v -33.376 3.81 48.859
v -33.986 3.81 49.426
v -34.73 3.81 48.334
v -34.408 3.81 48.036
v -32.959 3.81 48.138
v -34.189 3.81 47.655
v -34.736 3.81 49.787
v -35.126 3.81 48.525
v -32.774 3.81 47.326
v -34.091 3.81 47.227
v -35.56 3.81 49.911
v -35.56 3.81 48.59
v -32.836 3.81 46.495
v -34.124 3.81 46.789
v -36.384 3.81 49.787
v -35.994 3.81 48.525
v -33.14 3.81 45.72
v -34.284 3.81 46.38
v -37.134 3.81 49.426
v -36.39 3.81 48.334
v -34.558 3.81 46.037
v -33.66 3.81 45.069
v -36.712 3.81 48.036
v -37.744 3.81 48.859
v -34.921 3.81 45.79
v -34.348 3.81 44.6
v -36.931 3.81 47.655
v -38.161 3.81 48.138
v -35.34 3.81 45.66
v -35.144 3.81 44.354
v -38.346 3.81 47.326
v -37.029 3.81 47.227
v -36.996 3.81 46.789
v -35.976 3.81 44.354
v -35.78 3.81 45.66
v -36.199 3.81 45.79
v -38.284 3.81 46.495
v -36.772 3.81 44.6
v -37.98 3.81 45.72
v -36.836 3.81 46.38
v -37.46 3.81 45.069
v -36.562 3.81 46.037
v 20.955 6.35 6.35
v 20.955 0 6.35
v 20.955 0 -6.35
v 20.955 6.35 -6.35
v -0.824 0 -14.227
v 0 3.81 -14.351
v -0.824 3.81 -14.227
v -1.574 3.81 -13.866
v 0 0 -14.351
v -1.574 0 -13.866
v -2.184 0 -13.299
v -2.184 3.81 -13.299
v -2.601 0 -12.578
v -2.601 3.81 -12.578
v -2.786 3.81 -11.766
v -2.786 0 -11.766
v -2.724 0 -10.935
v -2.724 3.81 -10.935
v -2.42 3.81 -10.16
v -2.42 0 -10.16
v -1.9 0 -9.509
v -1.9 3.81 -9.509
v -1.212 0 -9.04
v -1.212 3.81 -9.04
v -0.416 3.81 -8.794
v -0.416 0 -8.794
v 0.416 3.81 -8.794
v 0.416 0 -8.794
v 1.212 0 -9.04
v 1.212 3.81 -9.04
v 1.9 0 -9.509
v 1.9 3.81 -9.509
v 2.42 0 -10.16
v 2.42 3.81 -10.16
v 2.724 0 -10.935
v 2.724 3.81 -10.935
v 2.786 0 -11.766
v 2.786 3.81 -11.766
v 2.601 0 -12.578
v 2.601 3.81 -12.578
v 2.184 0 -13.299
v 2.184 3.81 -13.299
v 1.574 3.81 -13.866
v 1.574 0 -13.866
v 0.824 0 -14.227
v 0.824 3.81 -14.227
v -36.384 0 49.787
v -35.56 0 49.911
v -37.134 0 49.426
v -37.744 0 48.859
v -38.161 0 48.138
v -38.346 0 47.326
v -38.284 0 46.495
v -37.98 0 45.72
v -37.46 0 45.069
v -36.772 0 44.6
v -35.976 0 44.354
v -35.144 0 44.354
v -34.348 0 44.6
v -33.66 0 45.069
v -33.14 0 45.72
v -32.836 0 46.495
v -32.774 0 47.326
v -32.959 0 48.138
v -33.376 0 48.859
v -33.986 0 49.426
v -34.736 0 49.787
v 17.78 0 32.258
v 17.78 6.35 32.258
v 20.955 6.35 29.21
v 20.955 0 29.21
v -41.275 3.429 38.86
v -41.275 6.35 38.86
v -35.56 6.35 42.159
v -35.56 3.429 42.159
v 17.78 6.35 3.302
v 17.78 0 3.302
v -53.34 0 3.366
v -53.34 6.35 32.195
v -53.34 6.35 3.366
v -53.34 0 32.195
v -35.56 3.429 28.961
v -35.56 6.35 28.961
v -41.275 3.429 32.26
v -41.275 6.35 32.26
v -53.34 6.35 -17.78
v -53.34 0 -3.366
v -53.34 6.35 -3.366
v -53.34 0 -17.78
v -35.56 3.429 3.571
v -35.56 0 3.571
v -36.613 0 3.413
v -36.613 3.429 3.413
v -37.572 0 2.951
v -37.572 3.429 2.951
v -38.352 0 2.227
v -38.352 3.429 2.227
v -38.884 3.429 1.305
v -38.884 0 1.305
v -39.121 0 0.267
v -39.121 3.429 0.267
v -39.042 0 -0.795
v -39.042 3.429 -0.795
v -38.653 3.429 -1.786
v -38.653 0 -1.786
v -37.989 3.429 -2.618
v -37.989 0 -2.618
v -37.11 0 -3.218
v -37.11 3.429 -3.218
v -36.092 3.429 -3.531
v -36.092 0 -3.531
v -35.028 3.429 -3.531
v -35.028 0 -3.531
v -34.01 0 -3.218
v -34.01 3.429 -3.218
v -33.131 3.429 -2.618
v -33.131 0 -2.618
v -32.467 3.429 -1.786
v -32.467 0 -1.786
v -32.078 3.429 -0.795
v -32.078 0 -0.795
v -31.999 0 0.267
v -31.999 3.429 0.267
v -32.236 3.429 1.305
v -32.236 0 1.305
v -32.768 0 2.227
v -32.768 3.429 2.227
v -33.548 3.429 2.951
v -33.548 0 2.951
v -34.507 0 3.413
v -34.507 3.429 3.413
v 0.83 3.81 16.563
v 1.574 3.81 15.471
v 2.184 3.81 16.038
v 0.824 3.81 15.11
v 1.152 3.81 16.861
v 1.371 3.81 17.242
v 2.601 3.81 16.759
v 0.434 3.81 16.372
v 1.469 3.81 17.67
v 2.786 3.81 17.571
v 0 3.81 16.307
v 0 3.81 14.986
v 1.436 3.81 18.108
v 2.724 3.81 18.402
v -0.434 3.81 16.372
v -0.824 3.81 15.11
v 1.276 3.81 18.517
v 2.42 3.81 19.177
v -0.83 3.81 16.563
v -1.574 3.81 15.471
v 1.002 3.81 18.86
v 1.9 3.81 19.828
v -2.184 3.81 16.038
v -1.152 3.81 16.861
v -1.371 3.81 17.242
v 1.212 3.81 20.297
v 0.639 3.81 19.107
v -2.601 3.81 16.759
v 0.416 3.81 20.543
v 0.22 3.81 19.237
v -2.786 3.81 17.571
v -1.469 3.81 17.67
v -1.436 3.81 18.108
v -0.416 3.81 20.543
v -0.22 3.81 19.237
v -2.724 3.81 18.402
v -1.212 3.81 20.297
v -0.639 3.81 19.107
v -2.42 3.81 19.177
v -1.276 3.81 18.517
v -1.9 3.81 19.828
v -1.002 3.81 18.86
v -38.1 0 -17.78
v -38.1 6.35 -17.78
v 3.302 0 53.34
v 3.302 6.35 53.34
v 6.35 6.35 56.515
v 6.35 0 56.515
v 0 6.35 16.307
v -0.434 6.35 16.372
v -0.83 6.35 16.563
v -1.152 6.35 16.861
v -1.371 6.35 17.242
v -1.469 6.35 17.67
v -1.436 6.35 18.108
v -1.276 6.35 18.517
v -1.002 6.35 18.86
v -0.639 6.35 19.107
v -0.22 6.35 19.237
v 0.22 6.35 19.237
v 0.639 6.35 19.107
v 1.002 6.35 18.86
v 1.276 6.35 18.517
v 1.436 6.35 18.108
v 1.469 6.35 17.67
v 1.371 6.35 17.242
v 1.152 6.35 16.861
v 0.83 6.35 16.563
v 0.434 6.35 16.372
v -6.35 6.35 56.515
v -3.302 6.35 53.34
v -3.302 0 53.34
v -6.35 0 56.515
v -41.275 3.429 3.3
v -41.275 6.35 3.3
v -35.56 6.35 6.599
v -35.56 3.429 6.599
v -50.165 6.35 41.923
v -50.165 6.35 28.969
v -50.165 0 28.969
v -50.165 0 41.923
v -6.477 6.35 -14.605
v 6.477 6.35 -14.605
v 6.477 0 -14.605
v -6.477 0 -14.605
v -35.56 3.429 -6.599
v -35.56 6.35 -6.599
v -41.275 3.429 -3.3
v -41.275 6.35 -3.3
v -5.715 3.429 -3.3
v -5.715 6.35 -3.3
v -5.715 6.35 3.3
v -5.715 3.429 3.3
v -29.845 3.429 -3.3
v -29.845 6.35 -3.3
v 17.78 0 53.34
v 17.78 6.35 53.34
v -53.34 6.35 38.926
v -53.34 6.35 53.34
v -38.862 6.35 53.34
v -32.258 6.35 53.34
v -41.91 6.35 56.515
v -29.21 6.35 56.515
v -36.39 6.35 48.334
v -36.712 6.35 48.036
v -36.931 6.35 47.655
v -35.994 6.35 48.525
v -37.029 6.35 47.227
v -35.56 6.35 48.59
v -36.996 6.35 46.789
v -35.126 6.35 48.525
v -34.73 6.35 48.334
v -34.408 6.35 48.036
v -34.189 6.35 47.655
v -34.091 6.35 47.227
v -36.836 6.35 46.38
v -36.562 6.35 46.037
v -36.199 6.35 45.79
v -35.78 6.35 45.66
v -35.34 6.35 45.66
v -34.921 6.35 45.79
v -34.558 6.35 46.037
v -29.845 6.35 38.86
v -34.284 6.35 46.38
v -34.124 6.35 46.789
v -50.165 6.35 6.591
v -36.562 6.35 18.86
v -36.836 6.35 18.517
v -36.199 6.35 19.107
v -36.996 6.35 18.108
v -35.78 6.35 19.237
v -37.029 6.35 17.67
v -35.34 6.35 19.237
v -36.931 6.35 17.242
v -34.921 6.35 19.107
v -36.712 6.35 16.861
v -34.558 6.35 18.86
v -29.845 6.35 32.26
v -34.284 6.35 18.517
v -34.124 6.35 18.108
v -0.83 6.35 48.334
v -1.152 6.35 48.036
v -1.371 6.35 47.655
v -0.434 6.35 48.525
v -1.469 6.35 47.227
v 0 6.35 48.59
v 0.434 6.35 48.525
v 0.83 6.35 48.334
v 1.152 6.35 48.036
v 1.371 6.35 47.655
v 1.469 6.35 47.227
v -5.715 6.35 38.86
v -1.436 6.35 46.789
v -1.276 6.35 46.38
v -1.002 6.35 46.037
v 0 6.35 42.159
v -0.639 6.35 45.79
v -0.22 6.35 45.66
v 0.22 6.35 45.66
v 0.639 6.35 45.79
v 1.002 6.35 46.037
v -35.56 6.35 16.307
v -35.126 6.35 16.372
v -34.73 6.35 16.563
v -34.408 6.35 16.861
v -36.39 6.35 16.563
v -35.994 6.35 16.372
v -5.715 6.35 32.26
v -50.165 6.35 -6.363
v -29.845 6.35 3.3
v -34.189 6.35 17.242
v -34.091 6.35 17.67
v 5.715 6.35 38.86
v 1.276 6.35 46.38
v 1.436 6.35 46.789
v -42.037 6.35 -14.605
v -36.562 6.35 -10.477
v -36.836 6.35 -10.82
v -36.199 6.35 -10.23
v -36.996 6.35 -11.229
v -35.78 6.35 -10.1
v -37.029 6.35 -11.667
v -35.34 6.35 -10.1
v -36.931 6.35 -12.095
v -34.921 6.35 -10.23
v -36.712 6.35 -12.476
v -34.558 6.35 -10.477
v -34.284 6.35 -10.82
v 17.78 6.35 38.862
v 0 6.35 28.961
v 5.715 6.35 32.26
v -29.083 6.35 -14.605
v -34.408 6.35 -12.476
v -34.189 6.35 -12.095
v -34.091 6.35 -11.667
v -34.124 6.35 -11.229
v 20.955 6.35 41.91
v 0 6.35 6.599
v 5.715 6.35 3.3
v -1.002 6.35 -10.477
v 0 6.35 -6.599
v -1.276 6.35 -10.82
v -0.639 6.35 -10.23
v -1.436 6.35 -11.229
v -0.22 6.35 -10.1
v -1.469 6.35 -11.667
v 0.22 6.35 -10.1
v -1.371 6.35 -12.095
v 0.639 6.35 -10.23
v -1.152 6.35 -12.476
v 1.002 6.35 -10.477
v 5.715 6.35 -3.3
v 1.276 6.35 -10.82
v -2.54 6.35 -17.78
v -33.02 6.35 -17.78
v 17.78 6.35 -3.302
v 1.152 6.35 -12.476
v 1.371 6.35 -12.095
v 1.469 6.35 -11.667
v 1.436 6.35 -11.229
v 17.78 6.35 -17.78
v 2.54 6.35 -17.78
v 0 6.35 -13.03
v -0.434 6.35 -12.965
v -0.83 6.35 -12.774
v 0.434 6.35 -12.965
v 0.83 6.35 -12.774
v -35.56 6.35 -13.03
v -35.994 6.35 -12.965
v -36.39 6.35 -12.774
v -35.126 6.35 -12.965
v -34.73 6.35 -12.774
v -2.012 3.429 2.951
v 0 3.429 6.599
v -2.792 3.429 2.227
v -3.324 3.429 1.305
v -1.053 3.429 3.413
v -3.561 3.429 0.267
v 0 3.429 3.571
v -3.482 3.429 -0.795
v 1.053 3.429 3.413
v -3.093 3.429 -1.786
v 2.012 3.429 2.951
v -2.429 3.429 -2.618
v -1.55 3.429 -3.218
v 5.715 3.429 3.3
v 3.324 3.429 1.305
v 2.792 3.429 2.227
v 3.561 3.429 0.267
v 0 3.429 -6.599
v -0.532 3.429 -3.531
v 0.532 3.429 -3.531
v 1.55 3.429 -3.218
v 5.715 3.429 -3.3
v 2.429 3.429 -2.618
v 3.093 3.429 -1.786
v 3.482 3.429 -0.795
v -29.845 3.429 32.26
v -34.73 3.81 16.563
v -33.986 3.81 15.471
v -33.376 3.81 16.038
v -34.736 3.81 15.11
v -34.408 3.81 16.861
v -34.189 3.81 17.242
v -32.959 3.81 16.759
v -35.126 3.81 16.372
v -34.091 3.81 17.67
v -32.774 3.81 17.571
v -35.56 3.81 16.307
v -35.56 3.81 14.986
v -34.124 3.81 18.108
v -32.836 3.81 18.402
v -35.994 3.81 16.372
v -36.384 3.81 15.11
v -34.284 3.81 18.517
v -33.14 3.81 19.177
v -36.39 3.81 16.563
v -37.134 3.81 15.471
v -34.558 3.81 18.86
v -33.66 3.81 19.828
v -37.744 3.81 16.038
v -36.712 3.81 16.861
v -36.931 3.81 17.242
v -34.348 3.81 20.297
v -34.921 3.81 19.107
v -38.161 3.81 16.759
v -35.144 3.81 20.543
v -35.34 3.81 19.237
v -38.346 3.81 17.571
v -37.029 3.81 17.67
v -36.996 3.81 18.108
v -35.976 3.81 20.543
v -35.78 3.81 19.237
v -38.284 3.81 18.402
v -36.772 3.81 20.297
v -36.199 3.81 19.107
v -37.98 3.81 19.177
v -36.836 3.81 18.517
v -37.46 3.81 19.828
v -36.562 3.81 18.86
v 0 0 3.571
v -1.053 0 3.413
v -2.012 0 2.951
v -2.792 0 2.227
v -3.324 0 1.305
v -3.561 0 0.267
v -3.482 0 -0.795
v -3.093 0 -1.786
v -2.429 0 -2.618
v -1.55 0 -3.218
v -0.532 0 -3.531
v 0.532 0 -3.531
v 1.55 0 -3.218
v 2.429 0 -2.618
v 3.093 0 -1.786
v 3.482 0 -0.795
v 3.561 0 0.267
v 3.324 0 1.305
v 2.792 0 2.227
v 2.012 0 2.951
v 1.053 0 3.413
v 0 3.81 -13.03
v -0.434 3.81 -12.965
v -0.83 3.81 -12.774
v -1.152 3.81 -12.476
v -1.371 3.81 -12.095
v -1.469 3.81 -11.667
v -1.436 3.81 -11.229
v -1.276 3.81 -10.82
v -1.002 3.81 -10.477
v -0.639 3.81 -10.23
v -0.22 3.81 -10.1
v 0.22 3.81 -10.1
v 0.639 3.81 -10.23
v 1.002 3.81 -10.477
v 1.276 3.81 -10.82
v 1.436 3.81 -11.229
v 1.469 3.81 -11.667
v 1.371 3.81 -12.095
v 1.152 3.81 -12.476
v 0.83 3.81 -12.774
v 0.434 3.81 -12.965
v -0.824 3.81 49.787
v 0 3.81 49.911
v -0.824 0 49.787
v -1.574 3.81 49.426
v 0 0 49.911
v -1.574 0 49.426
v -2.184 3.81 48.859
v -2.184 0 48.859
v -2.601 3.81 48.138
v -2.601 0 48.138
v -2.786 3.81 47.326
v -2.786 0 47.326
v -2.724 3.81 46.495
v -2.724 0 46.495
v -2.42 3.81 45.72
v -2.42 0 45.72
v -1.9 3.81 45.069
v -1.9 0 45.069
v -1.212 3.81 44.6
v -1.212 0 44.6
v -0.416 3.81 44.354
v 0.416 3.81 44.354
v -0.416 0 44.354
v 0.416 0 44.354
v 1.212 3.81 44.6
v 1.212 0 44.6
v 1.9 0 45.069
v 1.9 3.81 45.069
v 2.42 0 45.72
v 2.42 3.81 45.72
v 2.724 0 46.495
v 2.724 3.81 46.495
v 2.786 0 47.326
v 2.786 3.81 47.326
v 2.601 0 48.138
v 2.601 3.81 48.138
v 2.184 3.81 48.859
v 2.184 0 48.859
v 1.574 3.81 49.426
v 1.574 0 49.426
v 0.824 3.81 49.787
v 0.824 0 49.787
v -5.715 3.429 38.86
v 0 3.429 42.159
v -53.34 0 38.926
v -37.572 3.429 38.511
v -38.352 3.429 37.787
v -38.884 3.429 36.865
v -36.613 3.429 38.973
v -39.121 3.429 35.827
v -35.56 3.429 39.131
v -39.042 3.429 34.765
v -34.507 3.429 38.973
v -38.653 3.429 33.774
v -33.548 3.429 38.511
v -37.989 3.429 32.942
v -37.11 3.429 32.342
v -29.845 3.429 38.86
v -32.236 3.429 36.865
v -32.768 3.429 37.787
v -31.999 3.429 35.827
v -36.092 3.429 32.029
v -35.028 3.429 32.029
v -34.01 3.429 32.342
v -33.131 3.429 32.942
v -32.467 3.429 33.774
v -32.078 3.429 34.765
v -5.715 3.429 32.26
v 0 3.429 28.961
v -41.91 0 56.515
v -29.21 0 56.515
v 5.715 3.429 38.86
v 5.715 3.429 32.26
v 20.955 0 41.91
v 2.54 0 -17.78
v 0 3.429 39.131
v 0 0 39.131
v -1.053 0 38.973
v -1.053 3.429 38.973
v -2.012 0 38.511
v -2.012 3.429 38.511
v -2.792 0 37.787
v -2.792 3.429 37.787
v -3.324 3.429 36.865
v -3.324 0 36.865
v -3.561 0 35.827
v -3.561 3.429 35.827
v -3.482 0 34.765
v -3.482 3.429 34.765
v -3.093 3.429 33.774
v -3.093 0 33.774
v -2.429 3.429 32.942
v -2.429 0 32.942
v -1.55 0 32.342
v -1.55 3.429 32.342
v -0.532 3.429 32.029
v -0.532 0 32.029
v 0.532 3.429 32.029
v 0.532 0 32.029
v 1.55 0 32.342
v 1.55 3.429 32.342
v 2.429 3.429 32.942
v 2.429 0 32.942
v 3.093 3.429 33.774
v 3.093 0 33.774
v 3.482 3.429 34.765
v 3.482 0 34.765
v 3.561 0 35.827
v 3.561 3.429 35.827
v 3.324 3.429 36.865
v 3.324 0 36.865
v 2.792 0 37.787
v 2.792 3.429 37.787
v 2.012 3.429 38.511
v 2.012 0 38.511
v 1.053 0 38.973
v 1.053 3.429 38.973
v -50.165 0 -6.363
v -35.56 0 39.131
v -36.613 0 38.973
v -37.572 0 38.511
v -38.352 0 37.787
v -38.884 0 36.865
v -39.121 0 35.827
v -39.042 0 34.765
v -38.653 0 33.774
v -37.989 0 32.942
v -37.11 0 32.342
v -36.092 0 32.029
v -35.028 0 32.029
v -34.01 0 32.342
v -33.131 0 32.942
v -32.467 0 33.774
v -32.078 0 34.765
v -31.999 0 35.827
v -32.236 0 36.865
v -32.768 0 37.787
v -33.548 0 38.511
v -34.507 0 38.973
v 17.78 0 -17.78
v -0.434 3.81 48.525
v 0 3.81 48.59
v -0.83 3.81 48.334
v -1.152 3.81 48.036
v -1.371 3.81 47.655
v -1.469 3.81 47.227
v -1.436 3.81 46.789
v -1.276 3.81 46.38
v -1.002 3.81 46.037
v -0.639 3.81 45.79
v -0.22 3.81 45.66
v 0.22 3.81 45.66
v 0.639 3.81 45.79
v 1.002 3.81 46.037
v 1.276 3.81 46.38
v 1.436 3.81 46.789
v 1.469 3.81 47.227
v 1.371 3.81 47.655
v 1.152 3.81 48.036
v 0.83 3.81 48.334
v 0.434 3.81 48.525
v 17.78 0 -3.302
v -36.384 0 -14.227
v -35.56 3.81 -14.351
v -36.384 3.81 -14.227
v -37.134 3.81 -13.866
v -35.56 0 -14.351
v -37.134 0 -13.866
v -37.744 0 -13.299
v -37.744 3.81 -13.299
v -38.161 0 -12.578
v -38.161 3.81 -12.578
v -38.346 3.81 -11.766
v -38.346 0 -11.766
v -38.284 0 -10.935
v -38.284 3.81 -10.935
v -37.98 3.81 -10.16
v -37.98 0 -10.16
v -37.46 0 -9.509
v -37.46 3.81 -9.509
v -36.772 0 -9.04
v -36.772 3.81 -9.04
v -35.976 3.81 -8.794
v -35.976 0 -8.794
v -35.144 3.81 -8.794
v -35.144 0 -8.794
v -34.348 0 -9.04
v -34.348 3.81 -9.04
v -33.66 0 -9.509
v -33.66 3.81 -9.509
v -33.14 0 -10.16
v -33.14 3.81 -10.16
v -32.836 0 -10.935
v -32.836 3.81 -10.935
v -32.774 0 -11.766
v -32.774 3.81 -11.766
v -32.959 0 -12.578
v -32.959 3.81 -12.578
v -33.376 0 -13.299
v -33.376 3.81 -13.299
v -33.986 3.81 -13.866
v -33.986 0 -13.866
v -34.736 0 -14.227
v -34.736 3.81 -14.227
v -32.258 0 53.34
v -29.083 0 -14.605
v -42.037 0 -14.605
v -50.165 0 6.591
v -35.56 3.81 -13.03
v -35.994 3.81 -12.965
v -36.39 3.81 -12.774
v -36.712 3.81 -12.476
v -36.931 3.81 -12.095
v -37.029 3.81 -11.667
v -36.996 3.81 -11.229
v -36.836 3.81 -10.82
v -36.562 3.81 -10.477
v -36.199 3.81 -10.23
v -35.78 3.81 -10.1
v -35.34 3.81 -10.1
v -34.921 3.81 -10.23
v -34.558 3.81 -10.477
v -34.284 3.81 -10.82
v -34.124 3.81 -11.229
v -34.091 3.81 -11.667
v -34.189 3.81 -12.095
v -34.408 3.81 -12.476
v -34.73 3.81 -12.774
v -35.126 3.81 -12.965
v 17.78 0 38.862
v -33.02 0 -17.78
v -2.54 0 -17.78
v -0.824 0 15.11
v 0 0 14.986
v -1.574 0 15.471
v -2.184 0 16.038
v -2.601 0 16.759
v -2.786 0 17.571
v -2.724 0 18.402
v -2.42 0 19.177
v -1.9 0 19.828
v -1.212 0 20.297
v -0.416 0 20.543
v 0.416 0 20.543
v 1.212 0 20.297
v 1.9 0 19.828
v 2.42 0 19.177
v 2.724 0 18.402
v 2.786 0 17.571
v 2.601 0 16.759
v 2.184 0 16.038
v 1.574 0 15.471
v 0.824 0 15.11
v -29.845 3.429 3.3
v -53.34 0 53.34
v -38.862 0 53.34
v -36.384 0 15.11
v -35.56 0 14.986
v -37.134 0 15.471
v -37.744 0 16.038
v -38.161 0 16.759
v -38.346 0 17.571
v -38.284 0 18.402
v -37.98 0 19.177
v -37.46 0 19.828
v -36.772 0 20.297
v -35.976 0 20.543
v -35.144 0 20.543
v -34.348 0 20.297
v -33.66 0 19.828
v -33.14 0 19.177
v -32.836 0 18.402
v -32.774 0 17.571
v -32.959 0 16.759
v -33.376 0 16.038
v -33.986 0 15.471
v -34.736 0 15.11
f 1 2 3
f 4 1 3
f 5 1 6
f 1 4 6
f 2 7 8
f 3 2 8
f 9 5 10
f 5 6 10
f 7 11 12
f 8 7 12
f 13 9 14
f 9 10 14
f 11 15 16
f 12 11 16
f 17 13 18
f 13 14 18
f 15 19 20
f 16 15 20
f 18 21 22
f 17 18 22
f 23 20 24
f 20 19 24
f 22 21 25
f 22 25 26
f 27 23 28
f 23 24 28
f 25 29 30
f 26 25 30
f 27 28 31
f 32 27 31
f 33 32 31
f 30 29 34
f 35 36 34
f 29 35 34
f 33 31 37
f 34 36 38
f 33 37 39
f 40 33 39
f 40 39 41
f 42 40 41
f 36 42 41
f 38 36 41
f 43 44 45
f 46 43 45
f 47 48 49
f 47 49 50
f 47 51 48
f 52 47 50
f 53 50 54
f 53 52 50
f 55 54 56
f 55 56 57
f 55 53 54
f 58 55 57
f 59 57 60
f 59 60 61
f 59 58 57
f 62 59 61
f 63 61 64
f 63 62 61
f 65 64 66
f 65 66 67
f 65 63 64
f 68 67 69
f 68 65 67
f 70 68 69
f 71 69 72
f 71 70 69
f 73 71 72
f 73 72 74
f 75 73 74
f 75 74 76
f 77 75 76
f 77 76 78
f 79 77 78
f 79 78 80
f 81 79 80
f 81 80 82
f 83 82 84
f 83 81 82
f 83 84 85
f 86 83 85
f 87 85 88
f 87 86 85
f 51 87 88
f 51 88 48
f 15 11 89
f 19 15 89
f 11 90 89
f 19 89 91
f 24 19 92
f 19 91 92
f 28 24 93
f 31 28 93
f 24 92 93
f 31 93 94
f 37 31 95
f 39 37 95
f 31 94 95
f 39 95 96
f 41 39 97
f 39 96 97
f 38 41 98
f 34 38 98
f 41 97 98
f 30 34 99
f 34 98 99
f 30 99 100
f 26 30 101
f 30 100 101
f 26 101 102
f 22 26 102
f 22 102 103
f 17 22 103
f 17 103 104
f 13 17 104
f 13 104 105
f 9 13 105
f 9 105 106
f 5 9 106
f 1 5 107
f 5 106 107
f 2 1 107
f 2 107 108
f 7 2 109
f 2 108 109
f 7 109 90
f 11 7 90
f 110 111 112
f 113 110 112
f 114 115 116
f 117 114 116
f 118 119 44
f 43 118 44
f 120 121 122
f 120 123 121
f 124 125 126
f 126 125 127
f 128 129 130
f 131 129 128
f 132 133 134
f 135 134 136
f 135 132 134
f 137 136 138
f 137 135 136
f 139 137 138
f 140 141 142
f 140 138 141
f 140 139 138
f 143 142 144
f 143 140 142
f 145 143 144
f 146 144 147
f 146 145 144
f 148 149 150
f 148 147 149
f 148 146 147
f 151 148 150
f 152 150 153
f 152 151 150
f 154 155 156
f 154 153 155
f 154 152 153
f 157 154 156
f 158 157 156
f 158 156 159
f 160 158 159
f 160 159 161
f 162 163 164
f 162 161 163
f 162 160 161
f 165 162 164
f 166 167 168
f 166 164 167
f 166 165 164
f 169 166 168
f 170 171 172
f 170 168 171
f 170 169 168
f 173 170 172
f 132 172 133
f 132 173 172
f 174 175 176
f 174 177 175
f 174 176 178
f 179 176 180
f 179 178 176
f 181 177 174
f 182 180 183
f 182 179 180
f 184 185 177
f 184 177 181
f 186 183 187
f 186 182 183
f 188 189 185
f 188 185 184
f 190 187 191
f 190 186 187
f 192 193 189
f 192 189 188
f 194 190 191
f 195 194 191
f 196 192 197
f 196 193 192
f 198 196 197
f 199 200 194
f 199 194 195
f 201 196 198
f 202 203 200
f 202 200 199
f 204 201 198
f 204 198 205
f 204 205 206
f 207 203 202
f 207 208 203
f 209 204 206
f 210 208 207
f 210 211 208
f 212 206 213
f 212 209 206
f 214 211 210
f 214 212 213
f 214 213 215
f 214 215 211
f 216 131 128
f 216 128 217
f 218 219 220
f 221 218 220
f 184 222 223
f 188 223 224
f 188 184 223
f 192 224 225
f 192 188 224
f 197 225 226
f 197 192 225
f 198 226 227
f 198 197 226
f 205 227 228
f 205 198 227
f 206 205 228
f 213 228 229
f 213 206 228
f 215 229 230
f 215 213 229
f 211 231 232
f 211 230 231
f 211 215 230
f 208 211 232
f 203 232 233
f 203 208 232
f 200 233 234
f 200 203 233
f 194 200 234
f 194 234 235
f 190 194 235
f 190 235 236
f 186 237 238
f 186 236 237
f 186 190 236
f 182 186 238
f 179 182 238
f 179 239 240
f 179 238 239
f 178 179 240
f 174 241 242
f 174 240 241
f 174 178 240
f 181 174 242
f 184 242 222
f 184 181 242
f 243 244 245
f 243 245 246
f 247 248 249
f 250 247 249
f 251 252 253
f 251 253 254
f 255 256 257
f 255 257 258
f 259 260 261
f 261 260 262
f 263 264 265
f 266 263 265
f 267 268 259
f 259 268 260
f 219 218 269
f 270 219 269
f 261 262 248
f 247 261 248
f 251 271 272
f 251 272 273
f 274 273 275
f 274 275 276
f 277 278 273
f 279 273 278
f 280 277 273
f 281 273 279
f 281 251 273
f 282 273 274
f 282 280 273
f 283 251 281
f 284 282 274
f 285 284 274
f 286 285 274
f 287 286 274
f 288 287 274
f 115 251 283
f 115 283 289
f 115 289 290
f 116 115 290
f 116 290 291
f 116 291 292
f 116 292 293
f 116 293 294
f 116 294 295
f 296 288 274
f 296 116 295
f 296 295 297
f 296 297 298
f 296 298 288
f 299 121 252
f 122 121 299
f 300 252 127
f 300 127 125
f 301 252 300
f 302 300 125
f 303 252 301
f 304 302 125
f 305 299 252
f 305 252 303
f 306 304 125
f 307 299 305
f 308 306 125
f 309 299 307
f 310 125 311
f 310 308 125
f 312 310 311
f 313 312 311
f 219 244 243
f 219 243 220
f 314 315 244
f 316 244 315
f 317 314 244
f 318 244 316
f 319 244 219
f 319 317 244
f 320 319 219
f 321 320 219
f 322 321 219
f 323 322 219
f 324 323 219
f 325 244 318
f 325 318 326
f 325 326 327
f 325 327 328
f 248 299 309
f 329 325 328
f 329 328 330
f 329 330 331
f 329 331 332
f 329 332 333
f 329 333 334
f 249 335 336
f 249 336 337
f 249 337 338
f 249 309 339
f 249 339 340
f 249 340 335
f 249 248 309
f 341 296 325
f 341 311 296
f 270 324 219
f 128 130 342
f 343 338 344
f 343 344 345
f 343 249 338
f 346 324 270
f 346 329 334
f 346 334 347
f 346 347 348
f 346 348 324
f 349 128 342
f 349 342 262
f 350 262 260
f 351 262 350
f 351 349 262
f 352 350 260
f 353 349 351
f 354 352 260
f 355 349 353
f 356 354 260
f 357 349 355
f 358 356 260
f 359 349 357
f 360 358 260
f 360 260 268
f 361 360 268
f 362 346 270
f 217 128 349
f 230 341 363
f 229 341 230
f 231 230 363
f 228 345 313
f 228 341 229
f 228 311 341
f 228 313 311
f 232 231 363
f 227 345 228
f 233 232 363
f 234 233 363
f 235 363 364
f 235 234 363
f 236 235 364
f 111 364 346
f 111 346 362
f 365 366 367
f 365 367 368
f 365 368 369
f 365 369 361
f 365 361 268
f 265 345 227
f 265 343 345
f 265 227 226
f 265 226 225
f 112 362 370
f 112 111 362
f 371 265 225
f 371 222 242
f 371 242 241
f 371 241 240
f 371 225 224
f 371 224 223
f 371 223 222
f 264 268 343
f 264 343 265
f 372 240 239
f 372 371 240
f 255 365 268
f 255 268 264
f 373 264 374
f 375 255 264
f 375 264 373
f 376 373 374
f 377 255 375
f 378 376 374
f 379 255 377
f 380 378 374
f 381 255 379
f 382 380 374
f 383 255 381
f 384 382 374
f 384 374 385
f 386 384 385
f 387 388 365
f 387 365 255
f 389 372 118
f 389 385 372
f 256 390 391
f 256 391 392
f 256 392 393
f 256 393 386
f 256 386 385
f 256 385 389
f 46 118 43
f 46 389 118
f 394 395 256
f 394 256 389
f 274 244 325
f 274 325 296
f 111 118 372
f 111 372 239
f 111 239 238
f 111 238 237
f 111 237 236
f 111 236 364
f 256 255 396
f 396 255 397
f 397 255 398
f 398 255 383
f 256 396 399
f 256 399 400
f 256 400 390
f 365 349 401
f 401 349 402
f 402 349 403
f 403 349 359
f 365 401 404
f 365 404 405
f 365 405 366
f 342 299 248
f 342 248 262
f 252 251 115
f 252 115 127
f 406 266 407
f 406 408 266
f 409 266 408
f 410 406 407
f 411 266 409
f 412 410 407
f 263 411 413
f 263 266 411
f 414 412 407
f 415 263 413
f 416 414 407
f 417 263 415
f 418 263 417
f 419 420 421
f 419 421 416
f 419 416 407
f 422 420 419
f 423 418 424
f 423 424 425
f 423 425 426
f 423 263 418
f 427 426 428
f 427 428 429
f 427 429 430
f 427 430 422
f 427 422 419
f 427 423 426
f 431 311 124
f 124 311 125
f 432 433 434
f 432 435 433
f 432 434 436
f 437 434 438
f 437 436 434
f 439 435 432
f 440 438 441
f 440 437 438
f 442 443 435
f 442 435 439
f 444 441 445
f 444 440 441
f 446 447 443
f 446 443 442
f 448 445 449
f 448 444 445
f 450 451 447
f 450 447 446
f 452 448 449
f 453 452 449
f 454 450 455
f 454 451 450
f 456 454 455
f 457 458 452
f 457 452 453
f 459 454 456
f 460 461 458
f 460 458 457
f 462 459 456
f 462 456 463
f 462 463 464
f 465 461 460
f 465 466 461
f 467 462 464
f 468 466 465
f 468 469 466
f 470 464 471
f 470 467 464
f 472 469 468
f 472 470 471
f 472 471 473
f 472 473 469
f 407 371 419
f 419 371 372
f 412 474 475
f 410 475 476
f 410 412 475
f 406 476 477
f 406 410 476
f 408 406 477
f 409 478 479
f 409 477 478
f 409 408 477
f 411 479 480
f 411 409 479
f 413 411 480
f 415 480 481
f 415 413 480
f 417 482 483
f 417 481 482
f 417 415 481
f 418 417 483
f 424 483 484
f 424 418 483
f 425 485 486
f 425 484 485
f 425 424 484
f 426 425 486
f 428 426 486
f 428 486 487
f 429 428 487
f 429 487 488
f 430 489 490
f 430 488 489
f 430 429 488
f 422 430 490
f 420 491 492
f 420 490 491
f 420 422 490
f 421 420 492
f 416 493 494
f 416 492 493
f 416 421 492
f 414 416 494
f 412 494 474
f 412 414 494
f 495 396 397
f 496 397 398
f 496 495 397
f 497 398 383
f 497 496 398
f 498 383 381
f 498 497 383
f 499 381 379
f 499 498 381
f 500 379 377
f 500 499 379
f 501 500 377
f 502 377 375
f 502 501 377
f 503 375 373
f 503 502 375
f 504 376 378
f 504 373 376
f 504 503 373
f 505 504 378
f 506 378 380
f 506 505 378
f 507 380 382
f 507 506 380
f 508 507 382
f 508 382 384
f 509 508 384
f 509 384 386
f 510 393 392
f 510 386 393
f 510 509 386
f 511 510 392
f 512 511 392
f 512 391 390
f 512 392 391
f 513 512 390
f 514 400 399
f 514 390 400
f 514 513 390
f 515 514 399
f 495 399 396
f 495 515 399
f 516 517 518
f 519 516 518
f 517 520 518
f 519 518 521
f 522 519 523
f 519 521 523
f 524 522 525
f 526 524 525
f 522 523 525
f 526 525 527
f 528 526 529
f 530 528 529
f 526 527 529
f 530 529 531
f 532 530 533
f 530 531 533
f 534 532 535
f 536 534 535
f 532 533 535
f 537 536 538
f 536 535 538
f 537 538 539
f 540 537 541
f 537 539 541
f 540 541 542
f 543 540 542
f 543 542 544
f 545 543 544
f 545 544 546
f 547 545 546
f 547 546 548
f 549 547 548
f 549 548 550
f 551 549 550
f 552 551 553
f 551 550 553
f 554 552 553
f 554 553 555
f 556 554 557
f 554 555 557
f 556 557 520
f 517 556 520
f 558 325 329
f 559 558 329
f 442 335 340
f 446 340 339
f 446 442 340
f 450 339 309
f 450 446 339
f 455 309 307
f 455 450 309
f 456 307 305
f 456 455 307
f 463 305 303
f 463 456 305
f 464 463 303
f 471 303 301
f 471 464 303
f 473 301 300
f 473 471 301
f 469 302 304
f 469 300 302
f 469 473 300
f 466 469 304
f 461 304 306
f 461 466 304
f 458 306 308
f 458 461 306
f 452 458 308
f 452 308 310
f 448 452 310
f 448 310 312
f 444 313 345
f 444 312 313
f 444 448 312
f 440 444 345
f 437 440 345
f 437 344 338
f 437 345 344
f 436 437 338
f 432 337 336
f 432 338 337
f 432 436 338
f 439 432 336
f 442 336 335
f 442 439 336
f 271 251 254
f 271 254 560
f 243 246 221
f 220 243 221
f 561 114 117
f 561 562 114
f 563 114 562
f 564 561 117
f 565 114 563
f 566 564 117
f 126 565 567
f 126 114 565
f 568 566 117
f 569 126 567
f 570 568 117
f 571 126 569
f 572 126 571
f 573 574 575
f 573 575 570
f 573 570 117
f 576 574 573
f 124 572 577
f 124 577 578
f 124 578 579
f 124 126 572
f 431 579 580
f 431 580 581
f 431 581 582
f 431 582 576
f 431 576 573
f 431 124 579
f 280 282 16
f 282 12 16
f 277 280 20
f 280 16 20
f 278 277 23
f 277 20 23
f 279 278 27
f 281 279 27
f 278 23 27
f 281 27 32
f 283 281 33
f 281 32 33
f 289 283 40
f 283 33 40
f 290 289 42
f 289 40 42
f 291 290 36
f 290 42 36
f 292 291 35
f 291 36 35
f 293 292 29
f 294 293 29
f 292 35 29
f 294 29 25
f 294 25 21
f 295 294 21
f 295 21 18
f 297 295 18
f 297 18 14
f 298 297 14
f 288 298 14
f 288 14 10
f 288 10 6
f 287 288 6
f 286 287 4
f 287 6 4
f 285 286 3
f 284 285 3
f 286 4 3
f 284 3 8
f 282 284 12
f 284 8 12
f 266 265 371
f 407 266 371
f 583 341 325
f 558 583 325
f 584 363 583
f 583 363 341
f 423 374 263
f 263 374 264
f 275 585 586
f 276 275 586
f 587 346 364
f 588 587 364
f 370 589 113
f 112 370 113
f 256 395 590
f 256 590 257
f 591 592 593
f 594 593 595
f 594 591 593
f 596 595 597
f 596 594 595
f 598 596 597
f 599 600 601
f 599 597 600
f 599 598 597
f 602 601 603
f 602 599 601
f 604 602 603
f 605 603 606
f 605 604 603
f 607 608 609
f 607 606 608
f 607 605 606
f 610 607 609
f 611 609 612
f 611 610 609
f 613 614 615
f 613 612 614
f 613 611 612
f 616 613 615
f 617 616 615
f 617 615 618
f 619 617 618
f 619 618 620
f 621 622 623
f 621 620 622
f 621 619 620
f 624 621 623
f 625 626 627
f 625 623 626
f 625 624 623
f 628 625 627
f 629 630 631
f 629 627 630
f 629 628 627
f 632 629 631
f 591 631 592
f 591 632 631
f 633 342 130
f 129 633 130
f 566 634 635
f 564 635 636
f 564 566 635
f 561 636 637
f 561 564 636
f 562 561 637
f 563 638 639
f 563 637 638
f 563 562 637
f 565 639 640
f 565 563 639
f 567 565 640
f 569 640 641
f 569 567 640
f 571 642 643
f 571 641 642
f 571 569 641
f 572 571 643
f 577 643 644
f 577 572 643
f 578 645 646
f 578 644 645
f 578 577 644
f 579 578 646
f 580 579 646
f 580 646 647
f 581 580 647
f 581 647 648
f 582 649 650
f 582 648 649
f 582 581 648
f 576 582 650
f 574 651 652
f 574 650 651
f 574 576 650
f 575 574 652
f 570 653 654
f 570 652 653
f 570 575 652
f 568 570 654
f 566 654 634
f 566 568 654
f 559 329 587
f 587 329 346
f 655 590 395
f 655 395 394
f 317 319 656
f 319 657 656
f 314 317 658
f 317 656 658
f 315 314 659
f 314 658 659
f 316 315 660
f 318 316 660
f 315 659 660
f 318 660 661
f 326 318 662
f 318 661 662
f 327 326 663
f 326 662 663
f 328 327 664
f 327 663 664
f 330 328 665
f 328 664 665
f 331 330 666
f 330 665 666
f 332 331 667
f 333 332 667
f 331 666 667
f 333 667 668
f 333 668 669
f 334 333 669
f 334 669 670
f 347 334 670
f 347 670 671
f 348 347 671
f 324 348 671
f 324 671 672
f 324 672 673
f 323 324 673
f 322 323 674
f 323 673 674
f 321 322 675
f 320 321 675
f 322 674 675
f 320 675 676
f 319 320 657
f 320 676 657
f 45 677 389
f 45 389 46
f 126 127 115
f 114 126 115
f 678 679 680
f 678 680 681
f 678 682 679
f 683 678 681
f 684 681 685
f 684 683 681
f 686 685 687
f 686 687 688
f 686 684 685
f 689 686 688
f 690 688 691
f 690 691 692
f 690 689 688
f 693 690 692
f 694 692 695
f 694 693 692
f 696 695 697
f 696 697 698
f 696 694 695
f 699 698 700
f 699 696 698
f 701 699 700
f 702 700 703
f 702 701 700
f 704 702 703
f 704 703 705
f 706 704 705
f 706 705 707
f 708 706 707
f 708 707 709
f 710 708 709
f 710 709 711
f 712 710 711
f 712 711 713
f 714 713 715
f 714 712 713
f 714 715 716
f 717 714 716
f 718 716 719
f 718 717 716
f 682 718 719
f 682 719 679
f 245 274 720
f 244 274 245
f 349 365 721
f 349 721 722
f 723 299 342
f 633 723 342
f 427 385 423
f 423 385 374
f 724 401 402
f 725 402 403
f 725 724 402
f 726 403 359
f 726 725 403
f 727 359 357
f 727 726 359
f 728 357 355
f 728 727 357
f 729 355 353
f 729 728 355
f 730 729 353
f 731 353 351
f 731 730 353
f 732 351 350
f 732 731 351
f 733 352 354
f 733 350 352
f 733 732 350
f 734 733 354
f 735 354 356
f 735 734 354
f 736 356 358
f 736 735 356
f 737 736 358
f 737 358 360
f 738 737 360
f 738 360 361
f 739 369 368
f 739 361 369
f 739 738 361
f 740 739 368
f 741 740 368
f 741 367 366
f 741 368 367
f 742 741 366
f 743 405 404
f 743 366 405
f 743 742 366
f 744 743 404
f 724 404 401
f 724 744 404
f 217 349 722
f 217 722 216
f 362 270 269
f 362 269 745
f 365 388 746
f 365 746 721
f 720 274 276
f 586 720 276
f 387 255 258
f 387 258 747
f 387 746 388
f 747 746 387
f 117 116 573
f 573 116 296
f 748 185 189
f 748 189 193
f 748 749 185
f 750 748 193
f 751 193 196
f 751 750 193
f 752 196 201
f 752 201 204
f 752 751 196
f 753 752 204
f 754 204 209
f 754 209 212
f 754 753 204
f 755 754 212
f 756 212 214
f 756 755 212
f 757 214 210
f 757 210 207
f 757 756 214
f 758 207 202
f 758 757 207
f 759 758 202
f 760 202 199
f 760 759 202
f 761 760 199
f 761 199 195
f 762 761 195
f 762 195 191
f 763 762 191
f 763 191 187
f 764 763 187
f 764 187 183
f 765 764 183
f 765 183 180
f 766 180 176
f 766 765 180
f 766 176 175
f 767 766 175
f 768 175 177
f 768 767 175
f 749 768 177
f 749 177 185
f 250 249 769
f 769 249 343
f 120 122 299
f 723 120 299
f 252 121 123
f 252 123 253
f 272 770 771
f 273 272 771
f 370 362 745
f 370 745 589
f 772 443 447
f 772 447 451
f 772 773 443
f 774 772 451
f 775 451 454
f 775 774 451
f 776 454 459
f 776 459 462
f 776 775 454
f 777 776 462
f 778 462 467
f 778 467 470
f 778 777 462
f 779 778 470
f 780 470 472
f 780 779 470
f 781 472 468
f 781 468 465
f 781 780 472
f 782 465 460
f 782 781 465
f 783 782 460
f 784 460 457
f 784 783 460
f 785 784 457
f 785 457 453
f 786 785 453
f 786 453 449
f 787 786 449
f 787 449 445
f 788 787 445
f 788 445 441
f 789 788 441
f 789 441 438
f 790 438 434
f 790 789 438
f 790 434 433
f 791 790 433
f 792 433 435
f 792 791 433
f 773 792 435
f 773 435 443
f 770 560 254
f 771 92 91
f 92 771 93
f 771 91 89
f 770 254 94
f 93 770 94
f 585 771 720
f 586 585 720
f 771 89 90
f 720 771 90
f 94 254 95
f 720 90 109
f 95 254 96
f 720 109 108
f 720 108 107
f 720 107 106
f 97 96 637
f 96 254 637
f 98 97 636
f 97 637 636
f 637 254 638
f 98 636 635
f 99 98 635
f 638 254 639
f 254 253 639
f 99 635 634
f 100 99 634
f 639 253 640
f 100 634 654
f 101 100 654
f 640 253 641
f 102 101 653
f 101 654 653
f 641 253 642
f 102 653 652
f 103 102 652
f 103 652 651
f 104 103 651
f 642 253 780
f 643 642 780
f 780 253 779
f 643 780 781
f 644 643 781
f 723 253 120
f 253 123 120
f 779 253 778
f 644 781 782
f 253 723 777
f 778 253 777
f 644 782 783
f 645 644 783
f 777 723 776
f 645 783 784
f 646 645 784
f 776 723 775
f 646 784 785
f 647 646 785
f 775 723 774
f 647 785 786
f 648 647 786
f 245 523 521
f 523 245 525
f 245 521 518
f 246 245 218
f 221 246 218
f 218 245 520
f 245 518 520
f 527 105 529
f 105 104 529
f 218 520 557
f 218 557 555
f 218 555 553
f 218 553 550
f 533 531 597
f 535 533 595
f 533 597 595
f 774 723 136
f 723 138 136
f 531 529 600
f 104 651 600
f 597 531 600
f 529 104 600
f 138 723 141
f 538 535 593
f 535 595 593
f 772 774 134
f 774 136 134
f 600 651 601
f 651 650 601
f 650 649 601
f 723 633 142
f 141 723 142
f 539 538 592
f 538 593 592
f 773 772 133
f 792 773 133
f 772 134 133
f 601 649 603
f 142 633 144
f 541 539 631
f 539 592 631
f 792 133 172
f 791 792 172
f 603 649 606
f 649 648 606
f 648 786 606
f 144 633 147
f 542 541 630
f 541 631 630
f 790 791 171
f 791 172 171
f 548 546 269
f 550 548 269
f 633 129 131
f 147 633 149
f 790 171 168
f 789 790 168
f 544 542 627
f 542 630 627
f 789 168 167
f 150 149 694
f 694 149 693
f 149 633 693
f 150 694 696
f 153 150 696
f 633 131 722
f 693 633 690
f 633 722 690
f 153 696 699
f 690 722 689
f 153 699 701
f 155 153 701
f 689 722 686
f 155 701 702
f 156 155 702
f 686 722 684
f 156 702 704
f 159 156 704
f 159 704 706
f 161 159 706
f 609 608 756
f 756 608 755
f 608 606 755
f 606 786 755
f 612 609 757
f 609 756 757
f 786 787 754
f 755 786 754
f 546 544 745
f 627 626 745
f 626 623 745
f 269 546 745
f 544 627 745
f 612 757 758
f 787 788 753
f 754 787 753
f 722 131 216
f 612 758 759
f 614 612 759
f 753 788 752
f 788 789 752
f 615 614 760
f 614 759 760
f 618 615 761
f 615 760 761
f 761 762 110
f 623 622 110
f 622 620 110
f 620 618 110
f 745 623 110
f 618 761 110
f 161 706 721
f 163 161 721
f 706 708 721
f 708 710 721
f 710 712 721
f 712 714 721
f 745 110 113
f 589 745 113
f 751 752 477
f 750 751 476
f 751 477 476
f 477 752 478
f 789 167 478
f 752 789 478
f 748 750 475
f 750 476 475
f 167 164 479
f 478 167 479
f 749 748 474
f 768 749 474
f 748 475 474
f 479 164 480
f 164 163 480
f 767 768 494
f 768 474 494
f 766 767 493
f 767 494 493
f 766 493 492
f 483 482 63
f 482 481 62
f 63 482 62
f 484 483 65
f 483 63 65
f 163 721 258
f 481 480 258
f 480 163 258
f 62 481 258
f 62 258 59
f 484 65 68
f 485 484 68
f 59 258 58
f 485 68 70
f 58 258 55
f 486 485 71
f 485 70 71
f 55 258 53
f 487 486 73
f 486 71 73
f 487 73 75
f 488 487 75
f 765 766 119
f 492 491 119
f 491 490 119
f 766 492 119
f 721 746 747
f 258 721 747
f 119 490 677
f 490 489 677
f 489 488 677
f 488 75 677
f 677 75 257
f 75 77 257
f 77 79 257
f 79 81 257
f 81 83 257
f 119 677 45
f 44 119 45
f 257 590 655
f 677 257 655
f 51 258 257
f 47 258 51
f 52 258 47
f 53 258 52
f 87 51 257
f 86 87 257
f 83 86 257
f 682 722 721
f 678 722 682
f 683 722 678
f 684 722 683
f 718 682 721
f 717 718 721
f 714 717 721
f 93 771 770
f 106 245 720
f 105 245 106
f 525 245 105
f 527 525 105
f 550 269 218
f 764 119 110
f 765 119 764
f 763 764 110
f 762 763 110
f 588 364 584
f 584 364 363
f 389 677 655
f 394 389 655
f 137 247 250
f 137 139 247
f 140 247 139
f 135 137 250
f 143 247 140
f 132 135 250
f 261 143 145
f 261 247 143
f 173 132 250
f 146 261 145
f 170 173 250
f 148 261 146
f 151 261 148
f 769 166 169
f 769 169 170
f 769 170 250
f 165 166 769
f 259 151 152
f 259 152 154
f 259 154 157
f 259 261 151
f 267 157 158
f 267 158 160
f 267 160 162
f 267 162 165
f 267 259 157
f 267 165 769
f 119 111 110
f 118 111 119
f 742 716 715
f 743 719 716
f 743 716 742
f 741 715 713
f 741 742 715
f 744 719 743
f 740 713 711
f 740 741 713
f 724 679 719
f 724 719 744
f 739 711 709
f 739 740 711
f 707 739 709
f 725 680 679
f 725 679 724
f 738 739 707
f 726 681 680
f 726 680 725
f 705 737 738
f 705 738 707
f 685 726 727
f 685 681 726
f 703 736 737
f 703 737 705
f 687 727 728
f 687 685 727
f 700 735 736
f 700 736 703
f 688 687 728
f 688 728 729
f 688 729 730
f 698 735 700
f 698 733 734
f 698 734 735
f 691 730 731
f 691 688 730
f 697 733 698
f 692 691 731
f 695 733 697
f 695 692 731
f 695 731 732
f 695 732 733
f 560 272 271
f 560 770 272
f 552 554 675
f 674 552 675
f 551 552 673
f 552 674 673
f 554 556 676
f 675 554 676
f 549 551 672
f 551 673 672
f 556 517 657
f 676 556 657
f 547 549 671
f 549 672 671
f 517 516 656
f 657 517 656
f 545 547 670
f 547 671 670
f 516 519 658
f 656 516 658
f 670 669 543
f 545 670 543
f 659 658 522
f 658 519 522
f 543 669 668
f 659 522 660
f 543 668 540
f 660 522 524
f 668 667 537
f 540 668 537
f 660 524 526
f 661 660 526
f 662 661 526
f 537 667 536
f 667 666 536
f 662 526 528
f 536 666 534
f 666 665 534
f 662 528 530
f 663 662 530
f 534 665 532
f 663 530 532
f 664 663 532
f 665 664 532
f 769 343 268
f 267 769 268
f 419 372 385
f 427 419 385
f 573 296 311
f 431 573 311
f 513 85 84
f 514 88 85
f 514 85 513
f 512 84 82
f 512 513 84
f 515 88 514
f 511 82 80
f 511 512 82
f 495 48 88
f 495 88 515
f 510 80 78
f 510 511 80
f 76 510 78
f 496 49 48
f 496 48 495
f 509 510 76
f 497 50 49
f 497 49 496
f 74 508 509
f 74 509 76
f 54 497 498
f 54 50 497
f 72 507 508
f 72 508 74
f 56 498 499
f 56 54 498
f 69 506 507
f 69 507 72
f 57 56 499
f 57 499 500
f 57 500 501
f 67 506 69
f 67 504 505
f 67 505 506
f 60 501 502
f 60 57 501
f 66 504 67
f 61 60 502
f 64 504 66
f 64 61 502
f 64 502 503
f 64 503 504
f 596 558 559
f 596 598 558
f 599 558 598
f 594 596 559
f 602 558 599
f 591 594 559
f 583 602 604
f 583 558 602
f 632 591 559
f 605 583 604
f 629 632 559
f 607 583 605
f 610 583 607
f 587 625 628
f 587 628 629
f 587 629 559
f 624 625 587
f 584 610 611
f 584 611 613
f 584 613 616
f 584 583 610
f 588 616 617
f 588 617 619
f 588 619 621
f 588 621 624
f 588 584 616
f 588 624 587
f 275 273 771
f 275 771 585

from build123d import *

# Parameters (mm, degrees)
SKETCH1_W             = 35.56
SKETCH1_H             = 35.56
BOSS_EXTRUDE1_DEPTH   = 6.35
CUT_EXTRUDE1_DEPTH    = 2.921
LPATTERN11_COUNT      = 2
LPATTERN11_PITCH      = 35.56
LPATTERN11_COUNT_DIR2 = 2
LPATTERN11_PITCH_DIR2 = 35.56
LPATTERN15_COUNT      = 2
LPATTERN15_PITCH      = 35.56
LPATTERN16_COUNT      = 2
LPATTERN16_PITCH      = 35.56
SKETCH20_W            = 3.175
SKETCH20_H            = 12.7
BOSS_EXTRUDE2_DEPTH   = 6.35
CUT_EXTRUDE2_DEPTH    = 76.700949135
SKETCH22_W            = 12.7
SKETCH22_H            = 3.175
BOSS_EXTRUDE3_DEPTH   = 6.35
CUT_EXTRUDE3_DEPTH    = 78.97065682
CUT_EXTRUDE4_DEPTH    = 78.97065682
CUT_EXTRUDE5_DEPTH    = 78.97065682


with BuildPart() as part:
    # Sketch1 → Boss-Extrude1 (new body)
    with BuildSketch(Plane(origin=(0, 0, 0), x_dir=(1, 0, 0), z_dir=(0, 1, 0))):
        Rectangle(SKETCH1_W, SKETCH1_H)
    boss_extrude1 = extrude(amount=BOSS_EXTRUDE1_DEPTH)

    # Sketch2 → Cut-Extrude1 (cut)
    with BuildSketch(Plane(origin=(0, 6.35, 0), x_dir=(1, 0, 0), z_dir=(0, 1, 0))):
        Polygon((0, 6.599113577), (-5.715, 3.299556788), (-5.715, -3.299556788), (0, -6.599113577), (5.715, -3.299556788), (5.715, 3.299556788), align=None)
    cut_extrude1 = extrude(amount=-CUT_EXTRUDE1_DEPTH, mode=Mode.SUBTRACT)

    # Sketch3 → 1/4 Clearance Hole1 (revolve, cut)
    with BuildSketch(Plane(origin=(0, 3.429, 0), x_dir=(0, 0, 1), z_dir=(1, 0, 0))):
        Polygon((0, 0), (0, 11.035817477), (3.57124, 8.89), (3.57124, 0), align=None)
    f_1_4_clearance_hole1 = revolve(axis=Axis((0, 9.779, 0), (0, -1, 0)), mode=Mode.SUBTRACT)

    # LPattern11: Boss-Extrude1, Cut-Extrude1, 1_4 Clearance Hole1 2 × 2
    with Locations(*[(-j * LPATTERN11_PITCH_DIR2, 0, i * LPATTERN11_PITCH) for i in range(LPATTERN11_COUNT) for j in range(LPATTERN11_COUNT_DIR2) if (i, j) != (0, 0)]):
        add(boss_extrude1)
        add(cut_extrude1, mode=Mode.SUBTRACT)
        add(f_1_4_clearance_hole1, mode=Mode.SUBTRACT)

    # Sketch15 → CBORE for #4 Socket Head Cap Screw5 (revolve, cut)
    with BuildSketch(Plane(origin=(0, 0, -11.557), x_dir=(0, 0, -1), z_dir=(1, 0, 0))):
        Polygon((0, 0), (0, 9.775187864), (1.4732, 8.89), (1.4732, 3.81), (2.794, 3.81), (2.794, 0), align=None)
    cbore_for_4_socket_head_cap_screw5 = revolve(axis=Axis((0, -6.35, -11.557), (0, 1, 0)), mode=Mode.SUBTRACT)

    # LPattern15: CBORE for #4 Socket Head Cap Screw5 ×2
    with Locations(*[(-i * LPATTERN15_PITCH, 0, 0) for i in range(1, LPATTERN15_COUNT)]):
        add(cbore_for_4_socket_head_cap_screw5, mode=Mode.SUBTRACT)

    # Sketch17 → CBORE for #4 Socket Head Cap Screw6 (revolve, cut)
    with BuildSketch(Plane(origin=(0, 0, 17.78), x_dir=(0, 0, -1), z_dir=(1, 0, 0))):
        Polygon((0, 0), (0, 9.775187864), (1.4732, 8.89), (1.4732, 3.81), (2.794, 3.81), (2.794, 0), align=None)
    cbore_for_4_socket_head_cap_screw6 = revolve(axis=Axis((0, -6.35, 17.78), (0, 1, 0)), mode=Mode.SUBTRACT)

    # LPattern16: CBORE for #4 Socket Head Cap Screw6 ×2
    with Locations(*[(-i * LPATTERN16_PITCH, 0, 0) for i in range(1, LPATTERN16_COUNT)]):
        add(cbore_for_4_socket_head_cap_screw6, mode=Mode.SUBTRACT)

    # Mirror1: CBORE for #4 Socket Head Cap Screw5 across plane
    add(cbore_for_4_socket_head_cap_screw5.mirror(Plane.XY.offset(17.78)), mode=Mode.SUBTRACT)

    # Mirror1 copy 1 sketch → Mirror1 copy 1 (revolve, cut)
    with BuildSketch(Plane(origin=(-35.56, 0, 47.117), x_dir=(0, 0, 1), z_dir=(1, 0, 0))):
        Polygon((0, 0), (0, -9.775187864), (1.4732, -8.89), (1.4732, -3.81), (2.794, -3.81), (2.794, 0), align=None)
    revolve(axis=Axis((-35.56, -6.35, 47.117), (0, -1, 0)), mode=Mode.SUBTRACT)

    # Sketch20 → Boss-Extrude2 (add)
    with BuildSketch(Plane(origin=(0, 0, 0), x_dir=(1, 0, 0), z_dir=(0, 1, 0))):
        with Locations((19.3675, 0)):
            Rectangle(SKETCH20_W, SKETCH20_H)
        with Locations((19.3675, -35.56)):
            Rectangle(SKETCH20_W, SKETCH20_H)
    extrude(amount=BOSS_EXTRUDE2_DEPTH)

    # Sketch21 → Cut-Extrude2 (cut, through all)
    with BuildSketch(Plane(origin=(0, 6.35, 0), x_dir=(1, 0, 0), z_dir=(0, 1, 0))):
        Polygon((20.955, -6.35), (17.78, -6.35), (17.78, -3.302), align=None)
        Polygon((20.955, 6.35), (17.78, 6.35), (17.78, 3.302), align=None)
        Polygon((20.955, -29.21), (17.78, -29.21), (17.78, -32.258), align=None)
        Polygon((20.955, -41.91), (17.78, -41.91), (17.78, -38.862), align=None)
    extrude(amount=-CUT_EXTRUDE2_DEPTH, mode=Mode.SUBTRACT)

    # Sketch22 → Boss-Extrude3 (add)
    with BuildSketch(Plane(origin=(0, 0, 0), x_dir=(1, 0, 0), z_dir=(0, 1, 0))):
        with Locations((-35.56, -54.9275)):
            Rectangle(SKETCH22_W, SKETCH22_H)
        with Locations((0, -54.9275)):
            Rectangle(SKETCH22_W, SKETCH22_H)
    extrude(amount=BOSS_EXTRUDE3_DEPTH)

    # Sketch23 → Cut-Extrude3 (cut, through all)
    with BuildSketch(Plane(origin=(0, 6.35, 0), x_dir=(1, 0, 0), z_dir=(0, 1, 0))):
        Polygon((-41.91, -56.515), (-41.91, -53.34), (-38.862, -53.34), align=None)
        Polygon((-29.21, -56.515), (-29.21, -53.34), (-32.258, -53.34), align=None)
        Polygon((-6.35, -56.515), (-6.35, -53.34), (-3.302, -53.34), align=None)
        Polygon((6.35, -56.515), (6.35, -53.34), (3.302, -53.34), align=None)
    extrude(amount=-CUT_EXTRUDE3_DEPTH, mode=Mode.SUBTRACT)

    # Sketch24 → Cut-Extrude4 (cut, through all)
    with BuildSketch(Plane(origin=(0, 6.35, 0), x_dir=(1, 0, 0), z_dir=(0, 1, 0))):
        Polygon((-53.34, 3.3655), (-53.34, -3.3655), (-50.165, -6.5913), (-50.165, 6.3627), align=None)
    cut_extrude4 = extrude(amount=-CUT_EXTRUDE4_DEPTH, mode=Mode.SUBTRACT)

    # Mirror2: Cut-Extrude4 across plane
    add(cut_extrude4.mirror(Plane.XY.offset(17.78)), mode=Mode.SUBTRACT)

    # Sketch25 → Cut-Extrude5 (cut, through all)
    with BuildSketch(Plane(origin=(0, 6.35, 0), x_dir=(1, 0, 0), z_dir=(0, 1, 0))):
        Polygon((-38.1, 17.78), (-33.02, 17.78), (-29.083, 14.605), (-42.037, 14.605), align=None)
        Polygon((-2.54, 17.78), (2.54, 17.78), (6.477, 14.605), (-6.477, 14.605), align=None)
    extrude(amount=-CUT_EXTRUDE5_DEPTH, mode=Mode.SUBTRACT)


solid = part.part
